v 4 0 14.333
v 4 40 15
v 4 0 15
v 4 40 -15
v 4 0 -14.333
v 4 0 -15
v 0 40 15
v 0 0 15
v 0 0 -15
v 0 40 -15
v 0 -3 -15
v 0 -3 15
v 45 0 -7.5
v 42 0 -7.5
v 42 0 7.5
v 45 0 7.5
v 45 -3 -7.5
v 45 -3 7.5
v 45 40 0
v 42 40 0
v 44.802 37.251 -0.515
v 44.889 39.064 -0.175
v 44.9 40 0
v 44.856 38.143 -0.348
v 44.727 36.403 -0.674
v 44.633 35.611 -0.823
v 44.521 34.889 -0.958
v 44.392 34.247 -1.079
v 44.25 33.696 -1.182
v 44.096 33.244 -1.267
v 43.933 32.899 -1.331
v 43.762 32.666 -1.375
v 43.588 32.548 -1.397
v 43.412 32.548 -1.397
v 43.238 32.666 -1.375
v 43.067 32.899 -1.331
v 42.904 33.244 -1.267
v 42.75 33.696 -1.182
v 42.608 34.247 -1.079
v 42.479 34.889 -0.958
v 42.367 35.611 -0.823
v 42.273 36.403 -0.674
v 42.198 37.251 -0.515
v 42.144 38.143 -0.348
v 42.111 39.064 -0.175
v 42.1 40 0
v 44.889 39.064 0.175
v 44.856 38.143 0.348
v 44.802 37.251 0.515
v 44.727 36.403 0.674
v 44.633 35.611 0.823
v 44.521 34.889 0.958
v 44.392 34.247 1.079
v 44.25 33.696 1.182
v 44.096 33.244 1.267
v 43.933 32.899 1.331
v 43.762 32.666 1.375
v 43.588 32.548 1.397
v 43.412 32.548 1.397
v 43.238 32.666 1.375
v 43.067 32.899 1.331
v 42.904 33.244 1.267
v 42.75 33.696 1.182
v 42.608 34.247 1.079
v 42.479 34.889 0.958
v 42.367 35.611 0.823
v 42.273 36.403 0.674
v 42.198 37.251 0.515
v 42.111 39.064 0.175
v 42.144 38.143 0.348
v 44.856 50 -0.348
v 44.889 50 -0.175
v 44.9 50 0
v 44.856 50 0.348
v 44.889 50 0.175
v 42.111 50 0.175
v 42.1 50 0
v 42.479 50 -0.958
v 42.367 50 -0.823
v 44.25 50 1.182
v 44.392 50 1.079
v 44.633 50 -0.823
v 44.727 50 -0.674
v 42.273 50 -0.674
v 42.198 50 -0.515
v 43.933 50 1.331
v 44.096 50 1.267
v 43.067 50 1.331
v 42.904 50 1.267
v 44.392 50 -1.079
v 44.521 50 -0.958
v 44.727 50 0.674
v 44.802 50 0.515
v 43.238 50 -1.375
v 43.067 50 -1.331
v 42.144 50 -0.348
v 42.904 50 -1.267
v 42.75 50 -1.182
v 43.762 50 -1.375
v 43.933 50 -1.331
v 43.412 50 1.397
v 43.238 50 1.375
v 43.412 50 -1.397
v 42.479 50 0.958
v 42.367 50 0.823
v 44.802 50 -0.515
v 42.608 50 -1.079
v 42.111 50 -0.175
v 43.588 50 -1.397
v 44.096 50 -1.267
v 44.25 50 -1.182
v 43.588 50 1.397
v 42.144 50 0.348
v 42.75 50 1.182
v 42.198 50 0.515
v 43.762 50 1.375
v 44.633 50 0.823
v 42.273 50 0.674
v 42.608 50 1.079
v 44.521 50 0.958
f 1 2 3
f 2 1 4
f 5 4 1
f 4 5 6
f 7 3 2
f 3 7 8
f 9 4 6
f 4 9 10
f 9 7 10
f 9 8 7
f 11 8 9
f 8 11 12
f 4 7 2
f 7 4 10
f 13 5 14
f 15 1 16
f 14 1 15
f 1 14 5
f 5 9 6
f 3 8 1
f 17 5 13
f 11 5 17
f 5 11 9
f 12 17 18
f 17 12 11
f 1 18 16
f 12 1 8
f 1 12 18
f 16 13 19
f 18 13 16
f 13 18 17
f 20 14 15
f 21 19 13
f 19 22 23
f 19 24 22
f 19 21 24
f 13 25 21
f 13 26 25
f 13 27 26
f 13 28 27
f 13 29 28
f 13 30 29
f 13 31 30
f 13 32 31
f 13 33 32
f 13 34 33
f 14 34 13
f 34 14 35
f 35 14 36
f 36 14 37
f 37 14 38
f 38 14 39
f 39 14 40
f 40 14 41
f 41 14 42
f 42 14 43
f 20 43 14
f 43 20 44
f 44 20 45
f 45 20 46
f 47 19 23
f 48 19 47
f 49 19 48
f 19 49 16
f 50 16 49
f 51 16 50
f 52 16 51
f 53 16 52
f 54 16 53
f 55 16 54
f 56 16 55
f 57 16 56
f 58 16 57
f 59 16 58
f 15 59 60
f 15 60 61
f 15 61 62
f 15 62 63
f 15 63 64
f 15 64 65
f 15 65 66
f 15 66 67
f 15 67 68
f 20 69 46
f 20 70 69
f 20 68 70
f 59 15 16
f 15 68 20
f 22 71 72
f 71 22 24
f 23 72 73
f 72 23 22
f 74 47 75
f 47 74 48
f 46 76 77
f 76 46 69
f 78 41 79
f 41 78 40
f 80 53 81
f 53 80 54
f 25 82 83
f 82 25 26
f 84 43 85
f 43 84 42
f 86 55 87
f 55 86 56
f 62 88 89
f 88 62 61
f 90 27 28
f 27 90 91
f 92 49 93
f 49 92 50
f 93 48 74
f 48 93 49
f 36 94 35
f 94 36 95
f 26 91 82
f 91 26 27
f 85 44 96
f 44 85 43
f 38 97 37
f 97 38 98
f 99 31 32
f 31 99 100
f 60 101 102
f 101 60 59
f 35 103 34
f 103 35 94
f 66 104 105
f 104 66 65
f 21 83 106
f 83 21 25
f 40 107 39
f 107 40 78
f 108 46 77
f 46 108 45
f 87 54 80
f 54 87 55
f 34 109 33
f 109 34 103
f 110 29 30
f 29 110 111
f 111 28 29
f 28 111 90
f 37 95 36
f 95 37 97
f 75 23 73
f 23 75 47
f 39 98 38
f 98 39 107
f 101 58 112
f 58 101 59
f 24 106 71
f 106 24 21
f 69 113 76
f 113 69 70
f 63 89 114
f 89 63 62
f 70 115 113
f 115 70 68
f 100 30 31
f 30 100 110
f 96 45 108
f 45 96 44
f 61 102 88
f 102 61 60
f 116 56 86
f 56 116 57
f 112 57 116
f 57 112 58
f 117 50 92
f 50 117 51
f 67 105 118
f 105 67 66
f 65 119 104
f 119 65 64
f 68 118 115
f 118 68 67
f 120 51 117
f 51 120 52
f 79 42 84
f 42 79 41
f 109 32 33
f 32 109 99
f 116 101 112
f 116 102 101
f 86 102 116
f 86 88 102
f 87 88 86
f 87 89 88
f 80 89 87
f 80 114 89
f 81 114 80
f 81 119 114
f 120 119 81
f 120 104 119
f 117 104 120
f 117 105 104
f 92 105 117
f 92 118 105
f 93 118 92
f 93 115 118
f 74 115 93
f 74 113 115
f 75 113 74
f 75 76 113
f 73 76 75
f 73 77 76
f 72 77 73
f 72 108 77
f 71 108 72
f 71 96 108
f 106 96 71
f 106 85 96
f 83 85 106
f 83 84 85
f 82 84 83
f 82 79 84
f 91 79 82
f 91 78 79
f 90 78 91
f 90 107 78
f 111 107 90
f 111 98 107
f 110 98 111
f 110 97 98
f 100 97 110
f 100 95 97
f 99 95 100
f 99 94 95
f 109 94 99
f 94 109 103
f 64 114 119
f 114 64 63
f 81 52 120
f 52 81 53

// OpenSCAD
base_thickness = 4;
hook_depth = 45; // Distance the hook sticks out
hook_width = 30; // Thickness of the hook body
hook_height = 40;
peg_length = 20; // Length of the 3mm peg
peg_diameter = 2.8; // Tolerance adjusted for 3mm hole
peg_height = 40;
peg_base = 15;

union() {
  translate([0, 0, -hook_width / 2])
    cube([base_thickness, hook_height, hook_width]);

  rotate([90, 0, 0])
    translate([0, -hook_width / 2, 0])
      linear_extrude(3) {
        polygon(
          [
            [0, 0],
            [0, hook_width],
            [hook_depth, hook_width - (hook_width - peg_base) / 2],
            [hook_depth, (hook_width - peg_base) / 2],
          ]
        );
      }

  translate([hook_depth - 3, 0, peg_base / 2])
    rotate([90, 90, 90])
      linear_extrude(height=3) {
        polygon(
          [
            [0, 0],
            [peg_base, 0],
            [peg_base / 2, peg_height],
          ]
        );
      }

  // The 3mm Peg at the tip
  // Rotated to point upwards to fit into the bottom of the Gunpla
  translate([hook_depth - 1.5, peg_height - peg_length + 10, 0])
    rotate([-90, 0, 0])
      cylinder(d=peg_diameter, h=peg_length, $fn=50);
}
